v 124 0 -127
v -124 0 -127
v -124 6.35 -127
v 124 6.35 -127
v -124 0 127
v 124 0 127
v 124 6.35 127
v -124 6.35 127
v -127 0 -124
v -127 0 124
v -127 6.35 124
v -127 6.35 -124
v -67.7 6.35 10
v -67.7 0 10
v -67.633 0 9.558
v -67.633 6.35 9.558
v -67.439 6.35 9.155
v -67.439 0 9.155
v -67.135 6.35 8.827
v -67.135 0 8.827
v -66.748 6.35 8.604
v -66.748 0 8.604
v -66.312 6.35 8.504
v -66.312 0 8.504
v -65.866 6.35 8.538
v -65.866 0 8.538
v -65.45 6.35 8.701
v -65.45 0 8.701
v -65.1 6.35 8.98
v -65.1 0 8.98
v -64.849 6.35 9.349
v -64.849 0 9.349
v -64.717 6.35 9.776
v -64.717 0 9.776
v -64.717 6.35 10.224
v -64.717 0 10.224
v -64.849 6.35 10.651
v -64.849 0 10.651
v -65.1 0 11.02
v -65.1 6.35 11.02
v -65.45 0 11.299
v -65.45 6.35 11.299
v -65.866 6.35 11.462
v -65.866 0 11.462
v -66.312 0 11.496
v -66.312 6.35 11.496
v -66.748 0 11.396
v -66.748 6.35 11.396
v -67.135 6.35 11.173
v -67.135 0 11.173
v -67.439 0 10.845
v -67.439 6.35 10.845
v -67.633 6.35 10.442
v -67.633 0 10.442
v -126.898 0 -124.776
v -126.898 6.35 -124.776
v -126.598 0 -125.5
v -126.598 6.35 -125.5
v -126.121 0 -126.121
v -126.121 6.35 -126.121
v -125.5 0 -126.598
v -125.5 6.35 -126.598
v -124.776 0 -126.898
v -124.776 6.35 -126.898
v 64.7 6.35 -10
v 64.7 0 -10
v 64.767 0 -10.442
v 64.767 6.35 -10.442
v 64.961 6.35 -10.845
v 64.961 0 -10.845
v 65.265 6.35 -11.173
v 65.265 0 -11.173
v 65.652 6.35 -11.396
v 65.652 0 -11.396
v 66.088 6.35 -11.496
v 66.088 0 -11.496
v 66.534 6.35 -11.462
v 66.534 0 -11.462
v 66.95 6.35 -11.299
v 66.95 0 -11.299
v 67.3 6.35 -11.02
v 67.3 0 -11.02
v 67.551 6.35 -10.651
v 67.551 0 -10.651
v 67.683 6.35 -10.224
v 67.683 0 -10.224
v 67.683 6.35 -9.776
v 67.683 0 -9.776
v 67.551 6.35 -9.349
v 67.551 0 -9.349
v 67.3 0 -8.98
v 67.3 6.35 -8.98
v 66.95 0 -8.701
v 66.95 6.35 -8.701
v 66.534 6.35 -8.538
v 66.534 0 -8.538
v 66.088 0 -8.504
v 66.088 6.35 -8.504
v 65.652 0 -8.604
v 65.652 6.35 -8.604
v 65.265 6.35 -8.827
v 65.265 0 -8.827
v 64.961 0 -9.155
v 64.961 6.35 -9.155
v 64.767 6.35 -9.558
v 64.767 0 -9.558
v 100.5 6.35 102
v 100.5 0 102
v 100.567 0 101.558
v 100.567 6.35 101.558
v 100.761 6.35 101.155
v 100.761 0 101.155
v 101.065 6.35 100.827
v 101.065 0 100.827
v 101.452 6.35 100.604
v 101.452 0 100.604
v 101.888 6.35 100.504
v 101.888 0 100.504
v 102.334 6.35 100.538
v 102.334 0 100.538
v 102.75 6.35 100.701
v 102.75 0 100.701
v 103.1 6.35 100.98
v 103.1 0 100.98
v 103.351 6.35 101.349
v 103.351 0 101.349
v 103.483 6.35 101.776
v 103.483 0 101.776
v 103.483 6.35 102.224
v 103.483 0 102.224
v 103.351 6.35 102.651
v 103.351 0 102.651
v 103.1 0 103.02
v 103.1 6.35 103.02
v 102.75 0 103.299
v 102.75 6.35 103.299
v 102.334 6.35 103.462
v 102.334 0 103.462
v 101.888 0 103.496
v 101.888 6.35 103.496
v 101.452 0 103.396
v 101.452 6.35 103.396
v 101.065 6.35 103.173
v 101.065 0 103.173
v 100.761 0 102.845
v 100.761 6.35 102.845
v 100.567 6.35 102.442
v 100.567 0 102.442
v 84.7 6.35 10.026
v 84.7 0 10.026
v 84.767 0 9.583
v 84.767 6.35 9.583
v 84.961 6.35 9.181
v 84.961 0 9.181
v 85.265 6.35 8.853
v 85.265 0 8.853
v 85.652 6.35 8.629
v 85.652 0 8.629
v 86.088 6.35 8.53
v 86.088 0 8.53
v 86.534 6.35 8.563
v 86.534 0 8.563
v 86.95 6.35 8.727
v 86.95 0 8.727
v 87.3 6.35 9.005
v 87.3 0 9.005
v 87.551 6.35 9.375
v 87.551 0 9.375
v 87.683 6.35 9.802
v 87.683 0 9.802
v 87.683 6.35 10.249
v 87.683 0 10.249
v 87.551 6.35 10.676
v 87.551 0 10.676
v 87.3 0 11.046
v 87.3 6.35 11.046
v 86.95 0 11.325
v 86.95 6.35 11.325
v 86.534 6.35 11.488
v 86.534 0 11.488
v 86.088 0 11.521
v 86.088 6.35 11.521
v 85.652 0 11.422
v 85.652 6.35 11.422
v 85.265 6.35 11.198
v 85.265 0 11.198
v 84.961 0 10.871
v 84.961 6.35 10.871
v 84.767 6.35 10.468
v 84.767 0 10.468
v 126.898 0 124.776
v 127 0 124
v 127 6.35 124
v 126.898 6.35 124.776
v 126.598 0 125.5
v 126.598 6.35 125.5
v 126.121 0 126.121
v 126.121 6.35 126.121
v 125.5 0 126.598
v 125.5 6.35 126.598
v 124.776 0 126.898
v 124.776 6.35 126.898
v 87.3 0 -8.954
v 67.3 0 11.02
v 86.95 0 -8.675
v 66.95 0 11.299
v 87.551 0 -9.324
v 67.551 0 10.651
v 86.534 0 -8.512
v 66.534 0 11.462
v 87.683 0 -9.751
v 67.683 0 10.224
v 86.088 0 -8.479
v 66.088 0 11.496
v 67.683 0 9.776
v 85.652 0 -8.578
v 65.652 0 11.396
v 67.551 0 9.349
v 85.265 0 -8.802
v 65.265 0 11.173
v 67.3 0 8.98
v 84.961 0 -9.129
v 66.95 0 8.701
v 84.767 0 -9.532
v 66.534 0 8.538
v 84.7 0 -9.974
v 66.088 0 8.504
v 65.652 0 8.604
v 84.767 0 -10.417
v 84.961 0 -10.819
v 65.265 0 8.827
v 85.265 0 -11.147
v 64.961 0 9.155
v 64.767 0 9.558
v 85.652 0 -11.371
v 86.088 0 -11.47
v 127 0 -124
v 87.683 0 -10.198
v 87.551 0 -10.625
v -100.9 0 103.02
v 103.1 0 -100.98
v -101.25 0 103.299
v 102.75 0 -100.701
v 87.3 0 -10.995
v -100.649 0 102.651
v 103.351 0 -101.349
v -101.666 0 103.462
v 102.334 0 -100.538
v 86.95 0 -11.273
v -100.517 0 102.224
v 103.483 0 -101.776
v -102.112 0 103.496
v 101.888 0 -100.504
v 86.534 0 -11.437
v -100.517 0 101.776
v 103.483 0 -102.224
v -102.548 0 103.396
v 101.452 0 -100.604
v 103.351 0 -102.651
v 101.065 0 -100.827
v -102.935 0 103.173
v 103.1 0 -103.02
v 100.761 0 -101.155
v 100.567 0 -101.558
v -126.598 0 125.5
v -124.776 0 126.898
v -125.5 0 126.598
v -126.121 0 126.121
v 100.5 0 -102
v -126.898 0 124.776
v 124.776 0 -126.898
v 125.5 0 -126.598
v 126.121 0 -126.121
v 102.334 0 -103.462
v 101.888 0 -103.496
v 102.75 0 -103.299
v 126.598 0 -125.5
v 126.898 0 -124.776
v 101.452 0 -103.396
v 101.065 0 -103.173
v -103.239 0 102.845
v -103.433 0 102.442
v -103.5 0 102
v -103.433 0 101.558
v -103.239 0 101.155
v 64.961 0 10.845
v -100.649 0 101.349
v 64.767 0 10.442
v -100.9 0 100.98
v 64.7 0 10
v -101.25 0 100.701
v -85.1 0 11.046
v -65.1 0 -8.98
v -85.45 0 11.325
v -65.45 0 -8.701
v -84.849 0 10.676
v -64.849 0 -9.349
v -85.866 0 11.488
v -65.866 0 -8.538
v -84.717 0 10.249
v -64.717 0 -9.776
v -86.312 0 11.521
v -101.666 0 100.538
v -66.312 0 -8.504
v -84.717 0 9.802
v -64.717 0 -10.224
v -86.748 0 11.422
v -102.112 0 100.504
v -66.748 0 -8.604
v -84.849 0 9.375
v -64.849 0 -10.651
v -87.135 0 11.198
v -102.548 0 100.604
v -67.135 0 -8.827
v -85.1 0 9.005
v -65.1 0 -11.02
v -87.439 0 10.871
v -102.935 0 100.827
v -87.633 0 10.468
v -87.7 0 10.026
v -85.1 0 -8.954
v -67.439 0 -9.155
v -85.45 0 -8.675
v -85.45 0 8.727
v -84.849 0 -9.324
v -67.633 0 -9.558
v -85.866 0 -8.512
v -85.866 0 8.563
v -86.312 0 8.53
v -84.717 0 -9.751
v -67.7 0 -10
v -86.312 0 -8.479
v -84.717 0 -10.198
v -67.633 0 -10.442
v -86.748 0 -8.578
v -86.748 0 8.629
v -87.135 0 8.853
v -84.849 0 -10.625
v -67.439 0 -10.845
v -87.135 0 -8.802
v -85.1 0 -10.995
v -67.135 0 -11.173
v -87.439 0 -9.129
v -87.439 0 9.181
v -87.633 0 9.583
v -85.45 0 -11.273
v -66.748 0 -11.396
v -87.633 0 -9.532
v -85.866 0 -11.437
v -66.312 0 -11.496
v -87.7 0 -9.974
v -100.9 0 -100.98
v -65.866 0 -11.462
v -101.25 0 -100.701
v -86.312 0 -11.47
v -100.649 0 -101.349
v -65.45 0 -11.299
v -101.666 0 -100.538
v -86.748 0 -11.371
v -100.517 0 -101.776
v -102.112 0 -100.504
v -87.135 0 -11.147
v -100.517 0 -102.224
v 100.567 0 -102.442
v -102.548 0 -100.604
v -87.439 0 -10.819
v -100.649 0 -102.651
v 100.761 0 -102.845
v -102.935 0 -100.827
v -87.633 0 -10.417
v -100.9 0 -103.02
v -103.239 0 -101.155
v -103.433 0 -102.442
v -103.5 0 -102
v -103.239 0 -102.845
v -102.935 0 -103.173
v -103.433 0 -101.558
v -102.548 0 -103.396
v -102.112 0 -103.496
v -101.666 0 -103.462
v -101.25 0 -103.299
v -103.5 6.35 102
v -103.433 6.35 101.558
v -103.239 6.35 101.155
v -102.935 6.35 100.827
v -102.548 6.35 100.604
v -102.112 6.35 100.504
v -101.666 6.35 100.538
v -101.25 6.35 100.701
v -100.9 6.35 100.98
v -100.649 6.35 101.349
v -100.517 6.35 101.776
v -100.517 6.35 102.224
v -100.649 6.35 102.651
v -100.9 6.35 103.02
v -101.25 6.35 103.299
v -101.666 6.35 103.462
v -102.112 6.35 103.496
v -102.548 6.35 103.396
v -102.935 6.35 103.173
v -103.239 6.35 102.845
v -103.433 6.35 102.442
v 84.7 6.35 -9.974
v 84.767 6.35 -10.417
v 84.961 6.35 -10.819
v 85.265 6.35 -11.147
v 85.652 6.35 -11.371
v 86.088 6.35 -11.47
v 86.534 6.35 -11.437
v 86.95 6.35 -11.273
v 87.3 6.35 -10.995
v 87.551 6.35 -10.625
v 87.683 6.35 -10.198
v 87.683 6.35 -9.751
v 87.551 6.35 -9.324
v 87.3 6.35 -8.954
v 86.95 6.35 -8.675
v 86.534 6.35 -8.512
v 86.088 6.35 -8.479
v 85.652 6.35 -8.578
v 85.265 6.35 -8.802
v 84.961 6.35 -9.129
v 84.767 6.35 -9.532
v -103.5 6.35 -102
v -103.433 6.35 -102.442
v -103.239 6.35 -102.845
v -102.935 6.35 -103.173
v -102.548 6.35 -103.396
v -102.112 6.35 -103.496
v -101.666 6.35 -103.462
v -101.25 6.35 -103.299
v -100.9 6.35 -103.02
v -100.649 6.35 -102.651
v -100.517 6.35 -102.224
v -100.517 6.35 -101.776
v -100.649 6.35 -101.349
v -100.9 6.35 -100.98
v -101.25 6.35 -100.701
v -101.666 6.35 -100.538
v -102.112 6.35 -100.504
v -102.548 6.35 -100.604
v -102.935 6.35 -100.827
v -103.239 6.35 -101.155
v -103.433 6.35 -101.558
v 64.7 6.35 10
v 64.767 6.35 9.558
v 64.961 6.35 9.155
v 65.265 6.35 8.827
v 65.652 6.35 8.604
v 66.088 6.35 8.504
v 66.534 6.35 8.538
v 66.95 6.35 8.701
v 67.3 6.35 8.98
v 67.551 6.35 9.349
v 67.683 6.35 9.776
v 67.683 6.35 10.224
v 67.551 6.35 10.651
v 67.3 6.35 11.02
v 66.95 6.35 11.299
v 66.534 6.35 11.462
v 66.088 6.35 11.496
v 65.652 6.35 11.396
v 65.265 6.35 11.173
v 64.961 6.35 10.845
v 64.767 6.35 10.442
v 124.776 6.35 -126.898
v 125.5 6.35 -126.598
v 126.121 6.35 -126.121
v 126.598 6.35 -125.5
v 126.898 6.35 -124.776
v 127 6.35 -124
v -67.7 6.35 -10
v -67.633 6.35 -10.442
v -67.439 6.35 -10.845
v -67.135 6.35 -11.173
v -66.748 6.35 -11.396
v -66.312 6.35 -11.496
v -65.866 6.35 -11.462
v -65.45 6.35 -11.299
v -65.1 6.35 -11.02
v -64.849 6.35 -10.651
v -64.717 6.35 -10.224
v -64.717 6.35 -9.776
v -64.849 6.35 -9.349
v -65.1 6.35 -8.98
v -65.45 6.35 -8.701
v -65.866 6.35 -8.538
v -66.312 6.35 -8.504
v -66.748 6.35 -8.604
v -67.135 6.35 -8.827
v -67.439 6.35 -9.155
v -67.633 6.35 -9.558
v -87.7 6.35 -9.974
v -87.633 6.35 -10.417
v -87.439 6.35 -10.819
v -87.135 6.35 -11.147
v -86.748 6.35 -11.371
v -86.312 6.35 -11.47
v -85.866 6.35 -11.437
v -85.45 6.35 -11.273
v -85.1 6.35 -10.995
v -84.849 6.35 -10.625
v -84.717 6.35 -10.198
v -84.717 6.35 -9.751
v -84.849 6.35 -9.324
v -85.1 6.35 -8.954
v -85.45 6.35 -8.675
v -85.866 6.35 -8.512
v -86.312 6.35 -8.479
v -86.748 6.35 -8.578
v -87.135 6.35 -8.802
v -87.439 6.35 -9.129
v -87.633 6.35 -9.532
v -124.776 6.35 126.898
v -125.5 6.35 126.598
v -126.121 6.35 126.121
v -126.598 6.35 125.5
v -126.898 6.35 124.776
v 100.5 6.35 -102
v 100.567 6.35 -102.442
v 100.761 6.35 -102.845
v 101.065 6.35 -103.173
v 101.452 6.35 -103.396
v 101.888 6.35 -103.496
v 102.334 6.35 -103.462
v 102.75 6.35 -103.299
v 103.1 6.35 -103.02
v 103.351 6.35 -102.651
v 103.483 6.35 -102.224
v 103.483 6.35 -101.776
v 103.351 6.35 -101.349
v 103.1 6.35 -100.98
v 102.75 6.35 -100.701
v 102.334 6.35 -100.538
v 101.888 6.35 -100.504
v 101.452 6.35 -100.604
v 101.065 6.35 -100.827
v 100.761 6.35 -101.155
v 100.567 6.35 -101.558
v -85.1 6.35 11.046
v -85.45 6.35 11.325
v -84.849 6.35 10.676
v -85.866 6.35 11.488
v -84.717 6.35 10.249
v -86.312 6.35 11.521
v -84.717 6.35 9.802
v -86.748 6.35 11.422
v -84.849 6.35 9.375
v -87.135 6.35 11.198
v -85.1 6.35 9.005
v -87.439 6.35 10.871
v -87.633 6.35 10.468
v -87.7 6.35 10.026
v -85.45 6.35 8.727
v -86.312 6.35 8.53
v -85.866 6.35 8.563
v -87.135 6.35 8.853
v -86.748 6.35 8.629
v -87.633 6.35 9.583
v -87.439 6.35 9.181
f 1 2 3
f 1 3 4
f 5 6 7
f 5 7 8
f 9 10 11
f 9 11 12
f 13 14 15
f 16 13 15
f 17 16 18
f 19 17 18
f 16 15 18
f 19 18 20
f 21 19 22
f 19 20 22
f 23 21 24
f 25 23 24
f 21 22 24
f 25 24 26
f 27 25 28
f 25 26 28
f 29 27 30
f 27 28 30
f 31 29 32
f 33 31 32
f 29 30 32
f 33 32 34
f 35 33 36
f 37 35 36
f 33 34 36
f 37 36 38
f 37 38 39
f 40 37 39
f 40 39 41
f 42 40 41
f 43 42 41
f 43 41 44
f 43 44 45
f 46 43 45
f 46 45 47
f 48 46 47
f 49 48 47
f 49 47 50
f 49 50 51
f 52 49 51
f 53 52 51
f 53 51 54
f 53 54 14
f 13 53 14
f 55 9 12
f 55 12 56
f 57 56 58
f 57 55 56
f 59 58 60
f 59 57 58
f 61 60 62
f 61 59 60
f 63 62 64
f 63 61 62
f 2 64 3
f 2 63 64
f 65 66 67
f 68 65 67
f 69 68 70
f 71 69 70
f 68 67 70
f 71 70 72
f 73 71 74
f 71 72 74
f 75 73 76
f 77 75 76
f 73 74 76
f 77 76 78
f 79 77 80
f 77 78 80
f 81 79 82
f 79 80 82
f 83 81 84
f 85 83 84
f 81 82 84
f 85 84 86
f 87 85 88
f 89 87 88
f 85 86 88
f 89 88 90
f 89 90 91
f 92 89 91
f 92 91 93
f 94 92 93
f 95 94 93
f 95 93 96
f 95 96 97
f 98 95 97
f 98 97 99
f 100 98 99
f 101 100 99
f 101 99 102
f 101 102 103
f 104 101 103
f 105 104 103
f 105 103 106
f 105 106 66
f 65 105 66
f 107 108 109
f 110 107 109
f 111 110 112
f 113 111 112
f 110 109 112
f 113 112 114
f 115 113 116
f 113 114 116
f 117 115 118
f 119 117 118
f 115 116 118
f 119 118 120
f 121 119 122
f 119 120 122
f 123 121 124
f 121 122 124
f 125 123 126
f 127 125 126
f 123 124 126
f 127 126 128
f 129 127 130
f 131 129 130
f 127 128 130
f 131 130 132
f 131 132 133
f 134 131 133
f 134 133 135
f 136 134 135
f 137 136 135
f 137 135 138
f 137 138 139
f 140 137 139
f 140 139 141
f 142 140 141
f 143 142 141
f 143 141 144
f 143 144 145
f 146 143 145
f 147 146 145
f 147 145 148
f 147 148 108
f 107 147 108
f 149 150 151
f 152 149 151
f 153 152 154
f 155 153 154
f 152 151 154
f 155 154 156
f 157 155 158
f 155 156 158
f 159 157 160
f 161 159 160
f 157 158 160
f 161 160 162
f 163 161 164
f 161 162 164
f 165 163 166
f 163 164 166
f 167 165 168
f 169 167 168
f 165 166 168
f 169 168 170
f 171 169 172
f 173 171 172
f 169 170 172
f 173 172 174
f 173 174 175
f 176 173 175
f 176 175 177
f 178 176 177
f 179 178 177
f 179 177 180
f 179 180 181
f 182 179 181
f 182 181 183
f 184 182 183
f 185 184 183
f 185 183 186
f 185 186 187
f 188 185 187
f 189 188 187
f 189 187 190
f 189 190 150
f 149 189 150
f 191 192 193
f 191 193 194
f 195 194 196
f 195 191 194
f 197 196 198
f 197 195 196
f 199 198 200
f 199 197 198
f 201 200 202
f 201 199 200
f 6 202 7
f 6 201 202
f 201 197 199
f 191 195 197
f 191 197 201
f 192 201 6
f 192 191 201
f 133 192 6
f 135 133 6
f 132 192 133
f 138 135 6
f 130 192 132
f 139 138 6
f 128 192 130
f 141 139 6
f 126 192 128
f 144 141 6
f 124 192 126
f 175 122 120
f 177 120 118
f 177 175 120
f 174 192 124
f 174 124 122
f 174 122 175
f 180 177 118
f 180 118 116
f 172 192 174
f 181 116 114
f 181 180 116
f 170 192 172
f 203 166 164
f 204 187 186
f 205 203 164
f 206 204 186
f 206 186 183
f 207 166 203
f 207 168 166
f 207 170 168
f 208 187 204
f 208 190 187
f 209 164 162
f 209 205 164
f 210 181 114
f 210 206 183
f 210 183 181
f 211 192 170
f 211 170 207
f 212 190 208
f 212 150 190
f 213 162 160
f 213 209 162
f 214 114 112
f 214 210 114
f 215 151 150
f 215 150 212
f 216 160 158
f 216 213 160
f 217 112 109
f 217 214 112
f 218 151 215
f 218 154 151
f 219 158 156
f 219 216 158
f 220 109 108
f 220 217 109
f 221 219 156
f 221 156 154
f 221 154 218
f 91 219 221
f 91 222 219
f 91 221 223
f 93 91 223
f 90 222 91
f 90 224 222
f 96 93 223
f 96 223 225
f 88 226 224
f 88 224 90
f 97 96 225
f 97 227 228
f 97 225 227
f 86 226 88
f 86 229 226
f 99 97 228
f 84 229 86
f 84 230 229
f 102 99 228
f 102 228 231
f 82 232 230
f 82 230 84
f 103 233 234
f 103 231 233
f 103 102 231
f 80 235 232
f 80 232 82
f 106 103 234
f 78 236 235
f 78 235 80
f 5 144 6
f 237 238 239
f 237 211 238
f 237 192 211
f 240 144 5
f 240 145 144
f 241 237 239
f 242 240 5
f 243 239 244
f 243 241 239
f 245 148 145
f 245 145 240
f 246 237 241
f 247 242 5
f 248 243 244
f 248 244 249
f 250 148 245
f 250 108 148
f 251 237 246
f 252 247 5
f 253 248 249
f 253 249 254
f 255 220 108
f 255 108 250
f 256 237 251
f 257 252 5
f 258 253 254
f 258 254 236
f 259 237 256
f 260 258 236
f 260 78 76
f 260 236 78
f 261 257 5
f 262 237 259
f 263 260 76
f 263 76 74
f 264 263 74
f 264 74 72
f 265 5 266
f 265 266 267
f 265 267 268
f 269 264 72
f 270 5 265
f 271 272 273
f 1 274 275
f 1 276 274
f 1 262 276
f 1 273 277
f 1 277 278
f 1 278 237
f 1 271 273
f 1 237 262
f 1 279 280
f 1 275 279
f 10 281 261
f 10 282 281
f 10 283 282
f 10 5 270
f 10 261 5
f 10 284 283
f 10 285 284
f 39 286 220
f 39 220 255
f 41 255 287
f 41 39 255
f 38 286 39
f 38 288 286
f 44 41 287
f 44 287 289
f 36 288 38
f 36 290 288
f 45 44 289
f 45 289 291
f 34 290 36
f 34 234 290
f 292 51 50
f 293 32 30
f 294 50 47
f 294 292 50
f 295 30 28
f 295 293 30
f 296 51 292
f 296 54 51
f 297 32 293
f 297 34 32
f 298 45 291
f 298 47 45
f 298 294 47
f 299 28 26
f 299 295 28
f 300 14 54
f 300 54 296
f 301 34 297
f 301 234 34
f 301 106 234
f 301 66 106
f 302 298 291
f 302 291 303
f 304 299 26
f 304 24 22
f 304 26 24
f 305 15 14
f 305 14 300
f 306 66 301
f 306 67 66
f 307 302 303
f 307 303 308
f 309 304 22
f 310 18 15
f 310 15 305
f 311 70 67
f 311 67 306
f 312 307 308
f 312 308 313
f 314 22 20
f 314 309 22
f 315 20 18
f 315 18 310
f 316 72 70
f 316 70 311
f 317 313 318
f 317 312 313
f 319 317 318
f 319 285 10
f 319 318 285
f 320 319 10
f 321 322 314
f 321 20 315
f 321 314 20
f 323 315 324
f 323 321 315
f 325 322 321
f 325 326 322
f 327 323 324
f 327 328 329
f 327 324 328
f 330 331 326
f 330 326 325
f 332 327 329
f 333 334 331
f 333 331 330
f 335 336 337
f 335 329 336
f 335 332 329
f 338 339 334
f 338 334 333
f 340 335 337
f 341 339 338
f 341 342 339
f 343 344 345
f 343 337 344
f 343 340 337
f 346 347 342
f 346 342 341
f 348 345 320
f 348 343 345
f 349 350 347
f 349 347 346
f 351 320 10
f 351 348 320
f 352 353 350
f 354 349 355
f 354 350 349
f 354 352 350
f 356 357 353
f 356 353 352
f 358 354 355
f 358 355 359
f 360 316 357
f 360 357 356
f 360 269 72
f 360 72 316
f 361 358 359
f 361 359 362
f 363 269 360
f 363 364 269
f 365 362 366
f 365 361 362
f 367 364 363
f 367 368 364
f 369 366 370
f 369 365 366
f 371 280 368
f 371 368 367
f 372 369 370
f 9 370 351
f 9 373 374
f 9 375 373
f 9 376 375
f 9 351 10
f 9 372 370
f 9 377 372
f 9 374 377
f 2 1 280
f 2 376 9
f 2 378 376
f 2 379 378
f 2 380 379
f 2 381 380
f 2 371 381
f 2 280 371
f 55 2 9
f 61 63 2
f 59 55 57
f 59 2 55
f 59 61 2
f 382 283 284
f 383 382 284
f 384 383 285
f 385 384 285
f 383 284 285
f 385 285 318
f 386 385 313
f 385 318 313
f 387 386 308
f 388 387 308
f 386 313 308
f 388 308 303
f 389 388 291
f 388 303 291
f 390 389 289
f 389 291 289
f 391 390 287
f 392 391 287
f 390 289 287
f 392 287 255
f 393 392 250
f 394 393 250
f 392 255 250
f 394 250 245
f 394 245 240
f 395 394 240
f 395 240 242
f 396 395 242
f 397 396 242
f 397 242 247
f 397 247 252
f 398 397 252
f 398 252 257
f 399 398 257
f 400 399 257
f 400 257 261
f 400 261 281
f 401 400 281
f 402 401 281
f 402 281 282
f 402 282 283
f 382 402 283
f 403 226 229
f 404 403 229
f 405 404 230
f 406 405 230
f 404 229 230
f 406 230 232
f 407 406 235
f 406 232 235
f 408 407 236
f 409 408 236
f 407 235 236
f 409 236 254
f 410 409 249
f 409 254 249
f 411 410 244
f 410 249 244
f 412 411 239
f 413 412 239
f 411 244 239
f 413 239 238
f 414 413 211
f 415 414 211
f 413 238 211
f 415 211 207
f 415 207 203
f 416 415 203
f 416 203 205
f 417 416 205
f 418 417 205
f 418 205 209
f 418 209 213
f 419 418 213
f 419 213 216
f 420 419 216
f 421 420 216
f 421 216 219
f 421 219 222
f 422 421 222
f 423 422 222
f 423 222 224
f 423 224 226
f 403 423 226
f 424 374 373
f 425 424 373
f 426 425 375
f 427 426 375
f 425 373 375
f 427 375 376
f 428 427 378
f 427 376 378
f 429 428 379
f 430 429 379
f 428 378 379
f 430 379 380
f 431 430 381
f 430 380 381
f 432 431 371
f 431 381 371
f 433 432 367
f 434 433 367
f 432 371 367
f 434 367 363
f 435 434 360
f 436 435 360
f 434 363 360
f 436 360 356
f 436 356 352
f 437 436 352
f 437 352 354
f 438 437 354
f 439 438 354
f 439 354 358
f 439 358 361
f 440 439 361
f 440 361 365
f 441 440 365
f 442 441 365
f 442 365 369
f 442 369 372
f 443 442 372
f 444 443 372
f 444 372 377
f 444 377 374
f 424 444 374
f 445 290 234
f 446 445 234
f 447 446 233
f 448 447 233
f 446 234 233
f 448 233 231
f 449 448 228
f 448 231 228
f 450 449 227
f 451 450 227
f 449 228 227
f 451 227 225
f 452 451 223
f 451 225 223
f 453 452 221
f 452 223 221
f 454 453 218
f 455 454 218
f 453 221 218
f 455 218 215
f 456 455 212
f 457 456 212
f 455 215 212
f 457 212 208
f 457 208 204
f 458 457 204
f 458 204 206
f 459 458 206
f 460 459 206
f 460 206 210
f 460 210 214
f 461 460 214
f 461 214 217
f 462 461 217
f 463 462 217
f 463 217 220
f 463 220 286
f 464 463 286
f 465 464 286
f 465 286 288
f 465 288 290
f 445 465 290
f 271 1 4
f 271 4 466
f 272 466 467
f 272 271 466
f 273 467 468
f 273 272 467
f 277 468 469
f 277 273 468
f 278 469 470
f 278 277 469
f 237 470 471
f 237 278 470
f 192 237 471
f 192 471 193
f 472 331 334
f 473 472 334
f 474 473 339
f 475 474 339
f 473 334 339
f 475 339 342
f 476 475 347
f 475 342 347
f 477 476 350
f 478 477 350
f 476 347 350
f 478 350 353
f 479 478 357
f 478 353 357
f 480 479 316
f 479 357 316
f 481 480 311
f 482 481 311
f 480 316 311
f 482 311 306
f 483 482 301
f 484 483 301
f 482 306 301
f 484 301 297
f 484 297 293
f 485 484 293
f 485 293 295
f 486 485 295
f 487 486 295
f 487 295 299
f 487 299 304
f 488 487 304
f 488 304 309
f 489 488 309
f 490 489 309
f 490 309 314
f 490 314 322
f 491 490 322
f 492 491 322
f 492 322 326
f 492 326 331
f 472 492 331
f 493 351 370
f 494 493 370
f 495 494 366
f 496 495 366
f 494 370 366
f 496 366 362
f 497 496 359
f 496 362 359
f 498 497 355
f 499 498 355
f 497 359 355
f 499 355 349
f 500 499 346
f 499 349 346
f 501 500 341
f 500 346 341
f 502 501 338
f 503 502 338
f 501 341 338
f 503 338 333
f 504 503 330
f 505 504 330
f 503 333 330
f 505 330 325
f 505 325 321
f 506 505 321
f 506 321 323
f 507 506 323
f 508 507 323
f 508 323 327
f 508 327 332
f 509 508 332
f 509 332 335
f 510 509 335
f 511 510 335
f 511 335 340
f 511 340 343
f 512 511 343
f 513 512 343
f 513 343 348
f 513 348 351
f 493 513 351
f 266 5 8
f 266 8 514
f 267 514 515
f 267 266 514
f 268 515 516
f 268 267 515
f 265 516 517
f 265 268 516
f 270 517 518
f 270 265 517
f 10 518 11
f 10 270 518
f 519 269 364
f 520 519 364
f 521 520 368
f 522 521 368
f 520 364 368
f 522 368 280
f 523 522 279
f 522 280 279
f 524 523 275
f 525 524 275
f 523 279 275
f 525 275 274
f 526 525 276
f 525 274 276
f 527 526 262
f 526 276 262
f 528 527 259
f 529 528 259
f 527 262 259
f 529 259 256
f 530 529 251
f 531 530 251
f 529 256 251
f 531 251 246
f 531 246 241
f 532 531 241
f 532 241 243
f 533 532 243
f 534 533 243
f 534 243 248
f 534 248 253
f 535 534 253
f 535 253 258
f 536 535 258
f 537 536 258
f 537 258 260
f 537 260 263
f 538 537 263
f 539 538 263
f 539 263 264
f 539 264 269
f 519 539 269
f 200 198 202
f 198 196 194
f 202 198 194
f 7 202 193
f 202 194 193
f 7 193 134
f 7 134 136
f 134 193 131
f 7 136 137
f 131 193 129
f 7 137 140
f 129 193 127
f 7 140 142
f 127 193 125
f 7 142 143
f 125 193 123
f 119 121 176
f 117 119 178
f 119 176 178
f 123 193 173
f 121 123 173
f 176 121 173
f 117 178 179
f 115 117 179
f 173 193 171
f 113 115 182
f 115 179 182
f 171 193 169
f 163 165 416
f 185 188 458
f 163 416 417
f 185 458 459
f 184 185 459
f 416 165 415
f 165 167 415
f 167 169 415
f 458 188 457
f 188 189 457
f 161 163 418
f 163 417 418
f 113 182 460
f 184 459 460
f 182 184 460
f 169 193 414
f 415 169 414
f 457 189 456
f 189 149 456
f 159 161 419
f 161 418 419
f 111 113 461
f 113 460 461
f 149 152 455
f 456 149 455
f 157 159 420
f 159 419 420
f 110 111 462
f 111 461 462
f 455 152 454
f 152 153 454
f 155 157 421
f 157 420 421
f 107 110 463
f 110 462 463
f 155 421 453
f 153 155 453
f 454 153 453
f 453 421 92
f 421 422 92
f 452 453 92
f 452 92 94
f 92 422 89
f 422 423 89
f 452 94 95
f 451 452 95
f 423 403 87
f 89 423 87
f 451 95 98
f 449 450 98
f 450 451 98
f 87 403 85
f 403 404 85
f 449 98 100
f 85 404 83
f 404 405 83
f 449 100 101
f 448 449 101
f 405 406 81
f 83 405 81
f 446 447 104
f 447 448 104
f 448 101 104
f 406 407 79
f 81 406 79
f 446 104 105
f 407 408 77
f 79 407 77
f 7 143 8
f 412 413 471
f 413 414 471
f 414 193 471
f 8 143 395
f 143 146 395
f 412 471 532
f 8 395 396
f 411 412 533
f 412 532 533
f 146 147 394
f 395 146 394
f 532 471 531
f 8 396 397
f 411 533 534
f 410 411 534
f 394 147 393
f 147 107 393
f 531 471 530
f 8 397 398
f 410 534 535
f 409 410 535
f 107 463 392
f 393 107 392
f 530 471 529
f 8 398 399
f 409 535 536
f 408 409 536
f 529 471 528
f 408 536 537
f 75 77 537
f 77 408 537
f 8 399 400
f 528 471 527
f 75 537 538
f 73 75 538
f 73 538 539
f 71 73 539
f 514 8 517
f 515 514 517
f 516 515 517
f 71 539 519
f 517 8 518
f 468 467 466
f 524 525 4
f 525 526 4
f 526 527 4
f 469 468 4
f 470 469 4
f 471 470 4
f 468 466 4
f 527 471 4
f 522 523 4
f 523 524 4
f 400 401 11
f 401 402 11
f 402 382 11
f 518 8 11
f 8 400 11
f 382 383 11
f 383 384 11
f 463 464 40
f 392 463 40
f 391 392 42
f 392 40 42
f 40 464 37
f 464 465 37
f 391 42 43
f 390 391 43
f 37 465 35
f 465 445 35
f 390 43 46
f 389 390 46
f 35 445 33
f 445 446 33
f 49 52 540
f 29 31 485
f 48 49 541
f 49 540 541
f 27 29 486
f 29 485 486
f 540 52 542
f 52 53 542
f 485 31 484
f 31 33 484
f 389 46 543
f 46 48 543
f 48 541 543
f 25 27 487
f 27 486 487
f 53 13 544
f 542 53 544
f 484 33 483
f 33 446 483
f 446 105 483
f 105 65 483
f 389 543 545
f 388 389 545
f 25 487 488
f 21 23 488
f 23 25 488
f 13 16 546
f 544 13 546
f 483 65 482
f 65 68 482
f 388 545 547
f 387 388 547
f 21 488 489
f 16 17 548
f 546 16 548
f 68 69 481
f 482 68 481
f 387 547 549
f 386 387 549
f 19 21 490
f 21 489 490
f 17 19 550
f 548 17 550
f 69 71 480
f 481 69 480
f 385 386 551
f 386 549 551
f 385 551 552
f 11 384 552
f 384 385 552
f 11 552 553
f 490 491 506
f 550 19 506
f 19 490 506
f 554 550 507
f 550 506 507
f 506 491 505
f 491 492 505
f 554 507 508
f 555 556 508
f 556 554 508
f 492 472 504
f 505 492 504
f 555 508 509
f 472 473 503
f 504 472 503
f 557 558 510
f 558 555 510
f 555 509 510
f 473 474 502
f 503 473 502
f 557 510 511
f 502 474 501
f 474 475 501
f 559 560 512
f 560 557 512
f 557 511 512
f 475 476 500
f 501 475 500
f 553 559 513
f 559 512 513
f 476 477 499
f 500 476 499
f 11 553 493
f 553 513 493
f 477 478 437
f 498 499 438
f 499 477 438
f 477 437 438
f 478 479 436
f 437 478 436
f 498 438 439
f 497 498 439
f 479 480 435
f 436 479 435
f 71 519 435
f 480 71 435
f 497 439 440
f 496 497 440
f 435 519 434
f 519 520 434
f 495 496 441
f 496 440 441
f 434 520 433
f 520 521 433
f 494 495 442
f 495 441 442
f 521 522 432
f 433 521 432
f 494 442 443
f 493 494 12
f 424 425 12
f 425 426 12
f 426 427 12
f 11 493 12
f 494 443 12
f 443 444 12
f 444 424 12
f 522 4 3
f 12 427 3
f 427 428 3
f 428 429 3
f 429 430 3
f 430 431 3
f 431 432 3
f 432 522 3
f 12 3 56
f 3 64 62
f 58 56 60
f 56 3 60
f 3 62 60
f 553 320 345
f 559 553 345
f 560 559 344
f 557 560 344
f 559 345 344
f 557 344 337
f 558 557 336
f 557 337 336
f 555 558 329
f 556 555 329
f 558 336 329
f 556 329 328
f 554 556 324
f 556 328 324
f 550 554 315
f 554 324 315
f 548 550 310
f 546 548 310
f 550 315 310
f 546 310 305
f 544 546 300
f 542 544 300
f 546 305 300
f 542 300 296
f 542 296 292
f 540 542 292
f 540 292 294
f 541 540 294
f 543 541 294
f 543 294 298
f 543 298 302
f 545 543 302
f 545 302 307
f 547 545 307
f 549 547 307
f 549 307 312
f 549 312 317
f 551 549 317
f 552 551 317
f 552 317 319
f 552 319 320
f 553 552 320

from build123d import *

# Parameters (mm, degrees)
BOSS_EXTRUDE1_DEPTH   = 6.35
F_3_0MM_DOWEL_HOLE1_D = 3
F_3_0MM_DOWEL_HOLE2_D = 3


with BuildPart() as part:
    # Sketch1 → Boss-Extrude1 (new body)
    with BuildSketch(Plane(origin=(0, 0, 0), x_dir=(1, 0, 0), z_dir=(0, 1, 0))):
        with BuildLine():
            Line((-124, 127), (124, 127))
            ThreePointArc((124, 127), (126.121320344, 126.121320344), (127, 124))
            Line((127, 124), (127, -124))
            ThreePointArc((127, -124), (126.121320344, -126.121320344), (124, -127))
            Line((124, -127), (-124, -127))
            ThreePointArc((-124, -127), (-126.121320344, -126.121320344), (-127, -124))
            Line((-127, -124), (-127, 124))
            ThreePointArc((-127, 124), (-126.121320344, 126.121320344), (-124, 127))
        make_face()
    extrude(amount=BOSS_EXTRUDE1_DEPTH)

    # Ø3.0mm Dowel Hole1 (through all)
    with Locations(Plane(origin=(0, 6.35, 0), x_dir=(1, 0, 0), z_dir=(0, 1, 0))):
        with Locations((-102, 102), (-102, -102), (102, -102), (102, 102)):
            Hole(F_3_0MM_DOWEL_HOLE1_D / 2)

    # Ø3.0mm Dowel Hole2 (through all)
    with Locations(Plane(origin=(0, 6.35, 0), x_dir=(1, 0, 0), z_dir=(0, 1, 0))):
        with Locations((66.2, 10), (-66.2, 10), (-66.2, -10), (-86.2, -10.025616853), (-86.2, 9.974383147), (86.2, 9.974383147), (86.2, -10.025616853), (66.2, -10)):
            Hole(F_3_0MM_DOWEL_HOLE2_D / 2)


solid = part.part
